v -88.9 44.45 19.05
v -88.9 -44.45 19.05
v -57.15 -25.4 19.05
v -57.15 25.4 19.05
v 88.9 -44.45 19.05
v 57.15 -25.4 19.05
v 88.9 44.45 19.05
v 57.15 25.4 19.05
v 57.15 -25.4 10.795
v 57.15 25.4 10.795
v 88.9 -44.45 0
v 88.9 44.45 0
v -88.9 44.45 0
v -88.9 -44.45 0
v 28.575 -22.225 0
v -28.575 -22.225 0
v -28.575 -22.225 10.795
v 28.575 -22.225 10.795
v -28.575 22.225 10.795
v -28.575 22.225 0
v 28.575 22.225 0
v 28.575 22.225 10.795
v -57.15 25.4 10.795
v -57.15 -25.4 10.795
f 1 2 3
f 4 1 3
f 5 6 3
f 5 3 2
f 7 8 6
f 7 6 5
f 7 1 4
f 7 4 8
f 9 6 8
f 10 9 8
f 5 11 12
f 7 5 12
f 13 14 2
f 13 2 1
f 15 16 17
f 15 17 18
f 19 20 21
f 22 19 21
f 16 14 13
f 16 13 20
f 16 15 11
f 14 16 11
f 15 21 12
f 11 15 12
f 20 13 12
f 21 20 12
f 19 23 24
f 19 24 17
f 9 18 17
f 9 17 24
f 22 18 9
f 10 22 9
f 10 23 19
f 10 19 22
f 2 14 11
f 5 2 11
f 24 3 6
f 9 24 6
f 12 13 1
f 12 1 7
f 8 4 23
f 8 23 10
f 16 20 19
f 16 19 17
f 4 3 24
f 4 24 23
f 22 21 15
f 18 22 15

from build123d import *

# Parameters (mm, degrees)
F0_W     = 177.8
F0_H     = 88.9
F1_DEPTH = 19.05
F2_W     = 114.3
F2_H     = 50.8
F3_DEPTH = 8.255
F4_W     = 57.15
F4_H     = 44.45
F5_DEPTH = 19.051


with BuildPart() as f1:
    # F0 (on Top) → F1 (new body)
    with BuildSketch(Plane.XY):
        Rectangle(F0_W, F0_H)
    extrude(amount=F1_DEPTH)

    # F2 (on face) → F3 (cut)
    with BuildSketch(Plane.XY.offset(19.05)):
        Rectangle(F2_W, F2_H)
    extrude(amount=-F3_DEPTH, mode=Mode.SUBTRACT)

    # F4 (on face) → F5 (cut, through all)
    with BuildSketch(Plane(origin=(0, 0, 0), x_dir=(1, 0, 0), z_dir=(0, 0, -1))):
        Rectangle(F4_W, F4_H)
    extrude(amount=-F5_DEPTH, mode=Mode.SUBTRACT)


solid = f1.part
